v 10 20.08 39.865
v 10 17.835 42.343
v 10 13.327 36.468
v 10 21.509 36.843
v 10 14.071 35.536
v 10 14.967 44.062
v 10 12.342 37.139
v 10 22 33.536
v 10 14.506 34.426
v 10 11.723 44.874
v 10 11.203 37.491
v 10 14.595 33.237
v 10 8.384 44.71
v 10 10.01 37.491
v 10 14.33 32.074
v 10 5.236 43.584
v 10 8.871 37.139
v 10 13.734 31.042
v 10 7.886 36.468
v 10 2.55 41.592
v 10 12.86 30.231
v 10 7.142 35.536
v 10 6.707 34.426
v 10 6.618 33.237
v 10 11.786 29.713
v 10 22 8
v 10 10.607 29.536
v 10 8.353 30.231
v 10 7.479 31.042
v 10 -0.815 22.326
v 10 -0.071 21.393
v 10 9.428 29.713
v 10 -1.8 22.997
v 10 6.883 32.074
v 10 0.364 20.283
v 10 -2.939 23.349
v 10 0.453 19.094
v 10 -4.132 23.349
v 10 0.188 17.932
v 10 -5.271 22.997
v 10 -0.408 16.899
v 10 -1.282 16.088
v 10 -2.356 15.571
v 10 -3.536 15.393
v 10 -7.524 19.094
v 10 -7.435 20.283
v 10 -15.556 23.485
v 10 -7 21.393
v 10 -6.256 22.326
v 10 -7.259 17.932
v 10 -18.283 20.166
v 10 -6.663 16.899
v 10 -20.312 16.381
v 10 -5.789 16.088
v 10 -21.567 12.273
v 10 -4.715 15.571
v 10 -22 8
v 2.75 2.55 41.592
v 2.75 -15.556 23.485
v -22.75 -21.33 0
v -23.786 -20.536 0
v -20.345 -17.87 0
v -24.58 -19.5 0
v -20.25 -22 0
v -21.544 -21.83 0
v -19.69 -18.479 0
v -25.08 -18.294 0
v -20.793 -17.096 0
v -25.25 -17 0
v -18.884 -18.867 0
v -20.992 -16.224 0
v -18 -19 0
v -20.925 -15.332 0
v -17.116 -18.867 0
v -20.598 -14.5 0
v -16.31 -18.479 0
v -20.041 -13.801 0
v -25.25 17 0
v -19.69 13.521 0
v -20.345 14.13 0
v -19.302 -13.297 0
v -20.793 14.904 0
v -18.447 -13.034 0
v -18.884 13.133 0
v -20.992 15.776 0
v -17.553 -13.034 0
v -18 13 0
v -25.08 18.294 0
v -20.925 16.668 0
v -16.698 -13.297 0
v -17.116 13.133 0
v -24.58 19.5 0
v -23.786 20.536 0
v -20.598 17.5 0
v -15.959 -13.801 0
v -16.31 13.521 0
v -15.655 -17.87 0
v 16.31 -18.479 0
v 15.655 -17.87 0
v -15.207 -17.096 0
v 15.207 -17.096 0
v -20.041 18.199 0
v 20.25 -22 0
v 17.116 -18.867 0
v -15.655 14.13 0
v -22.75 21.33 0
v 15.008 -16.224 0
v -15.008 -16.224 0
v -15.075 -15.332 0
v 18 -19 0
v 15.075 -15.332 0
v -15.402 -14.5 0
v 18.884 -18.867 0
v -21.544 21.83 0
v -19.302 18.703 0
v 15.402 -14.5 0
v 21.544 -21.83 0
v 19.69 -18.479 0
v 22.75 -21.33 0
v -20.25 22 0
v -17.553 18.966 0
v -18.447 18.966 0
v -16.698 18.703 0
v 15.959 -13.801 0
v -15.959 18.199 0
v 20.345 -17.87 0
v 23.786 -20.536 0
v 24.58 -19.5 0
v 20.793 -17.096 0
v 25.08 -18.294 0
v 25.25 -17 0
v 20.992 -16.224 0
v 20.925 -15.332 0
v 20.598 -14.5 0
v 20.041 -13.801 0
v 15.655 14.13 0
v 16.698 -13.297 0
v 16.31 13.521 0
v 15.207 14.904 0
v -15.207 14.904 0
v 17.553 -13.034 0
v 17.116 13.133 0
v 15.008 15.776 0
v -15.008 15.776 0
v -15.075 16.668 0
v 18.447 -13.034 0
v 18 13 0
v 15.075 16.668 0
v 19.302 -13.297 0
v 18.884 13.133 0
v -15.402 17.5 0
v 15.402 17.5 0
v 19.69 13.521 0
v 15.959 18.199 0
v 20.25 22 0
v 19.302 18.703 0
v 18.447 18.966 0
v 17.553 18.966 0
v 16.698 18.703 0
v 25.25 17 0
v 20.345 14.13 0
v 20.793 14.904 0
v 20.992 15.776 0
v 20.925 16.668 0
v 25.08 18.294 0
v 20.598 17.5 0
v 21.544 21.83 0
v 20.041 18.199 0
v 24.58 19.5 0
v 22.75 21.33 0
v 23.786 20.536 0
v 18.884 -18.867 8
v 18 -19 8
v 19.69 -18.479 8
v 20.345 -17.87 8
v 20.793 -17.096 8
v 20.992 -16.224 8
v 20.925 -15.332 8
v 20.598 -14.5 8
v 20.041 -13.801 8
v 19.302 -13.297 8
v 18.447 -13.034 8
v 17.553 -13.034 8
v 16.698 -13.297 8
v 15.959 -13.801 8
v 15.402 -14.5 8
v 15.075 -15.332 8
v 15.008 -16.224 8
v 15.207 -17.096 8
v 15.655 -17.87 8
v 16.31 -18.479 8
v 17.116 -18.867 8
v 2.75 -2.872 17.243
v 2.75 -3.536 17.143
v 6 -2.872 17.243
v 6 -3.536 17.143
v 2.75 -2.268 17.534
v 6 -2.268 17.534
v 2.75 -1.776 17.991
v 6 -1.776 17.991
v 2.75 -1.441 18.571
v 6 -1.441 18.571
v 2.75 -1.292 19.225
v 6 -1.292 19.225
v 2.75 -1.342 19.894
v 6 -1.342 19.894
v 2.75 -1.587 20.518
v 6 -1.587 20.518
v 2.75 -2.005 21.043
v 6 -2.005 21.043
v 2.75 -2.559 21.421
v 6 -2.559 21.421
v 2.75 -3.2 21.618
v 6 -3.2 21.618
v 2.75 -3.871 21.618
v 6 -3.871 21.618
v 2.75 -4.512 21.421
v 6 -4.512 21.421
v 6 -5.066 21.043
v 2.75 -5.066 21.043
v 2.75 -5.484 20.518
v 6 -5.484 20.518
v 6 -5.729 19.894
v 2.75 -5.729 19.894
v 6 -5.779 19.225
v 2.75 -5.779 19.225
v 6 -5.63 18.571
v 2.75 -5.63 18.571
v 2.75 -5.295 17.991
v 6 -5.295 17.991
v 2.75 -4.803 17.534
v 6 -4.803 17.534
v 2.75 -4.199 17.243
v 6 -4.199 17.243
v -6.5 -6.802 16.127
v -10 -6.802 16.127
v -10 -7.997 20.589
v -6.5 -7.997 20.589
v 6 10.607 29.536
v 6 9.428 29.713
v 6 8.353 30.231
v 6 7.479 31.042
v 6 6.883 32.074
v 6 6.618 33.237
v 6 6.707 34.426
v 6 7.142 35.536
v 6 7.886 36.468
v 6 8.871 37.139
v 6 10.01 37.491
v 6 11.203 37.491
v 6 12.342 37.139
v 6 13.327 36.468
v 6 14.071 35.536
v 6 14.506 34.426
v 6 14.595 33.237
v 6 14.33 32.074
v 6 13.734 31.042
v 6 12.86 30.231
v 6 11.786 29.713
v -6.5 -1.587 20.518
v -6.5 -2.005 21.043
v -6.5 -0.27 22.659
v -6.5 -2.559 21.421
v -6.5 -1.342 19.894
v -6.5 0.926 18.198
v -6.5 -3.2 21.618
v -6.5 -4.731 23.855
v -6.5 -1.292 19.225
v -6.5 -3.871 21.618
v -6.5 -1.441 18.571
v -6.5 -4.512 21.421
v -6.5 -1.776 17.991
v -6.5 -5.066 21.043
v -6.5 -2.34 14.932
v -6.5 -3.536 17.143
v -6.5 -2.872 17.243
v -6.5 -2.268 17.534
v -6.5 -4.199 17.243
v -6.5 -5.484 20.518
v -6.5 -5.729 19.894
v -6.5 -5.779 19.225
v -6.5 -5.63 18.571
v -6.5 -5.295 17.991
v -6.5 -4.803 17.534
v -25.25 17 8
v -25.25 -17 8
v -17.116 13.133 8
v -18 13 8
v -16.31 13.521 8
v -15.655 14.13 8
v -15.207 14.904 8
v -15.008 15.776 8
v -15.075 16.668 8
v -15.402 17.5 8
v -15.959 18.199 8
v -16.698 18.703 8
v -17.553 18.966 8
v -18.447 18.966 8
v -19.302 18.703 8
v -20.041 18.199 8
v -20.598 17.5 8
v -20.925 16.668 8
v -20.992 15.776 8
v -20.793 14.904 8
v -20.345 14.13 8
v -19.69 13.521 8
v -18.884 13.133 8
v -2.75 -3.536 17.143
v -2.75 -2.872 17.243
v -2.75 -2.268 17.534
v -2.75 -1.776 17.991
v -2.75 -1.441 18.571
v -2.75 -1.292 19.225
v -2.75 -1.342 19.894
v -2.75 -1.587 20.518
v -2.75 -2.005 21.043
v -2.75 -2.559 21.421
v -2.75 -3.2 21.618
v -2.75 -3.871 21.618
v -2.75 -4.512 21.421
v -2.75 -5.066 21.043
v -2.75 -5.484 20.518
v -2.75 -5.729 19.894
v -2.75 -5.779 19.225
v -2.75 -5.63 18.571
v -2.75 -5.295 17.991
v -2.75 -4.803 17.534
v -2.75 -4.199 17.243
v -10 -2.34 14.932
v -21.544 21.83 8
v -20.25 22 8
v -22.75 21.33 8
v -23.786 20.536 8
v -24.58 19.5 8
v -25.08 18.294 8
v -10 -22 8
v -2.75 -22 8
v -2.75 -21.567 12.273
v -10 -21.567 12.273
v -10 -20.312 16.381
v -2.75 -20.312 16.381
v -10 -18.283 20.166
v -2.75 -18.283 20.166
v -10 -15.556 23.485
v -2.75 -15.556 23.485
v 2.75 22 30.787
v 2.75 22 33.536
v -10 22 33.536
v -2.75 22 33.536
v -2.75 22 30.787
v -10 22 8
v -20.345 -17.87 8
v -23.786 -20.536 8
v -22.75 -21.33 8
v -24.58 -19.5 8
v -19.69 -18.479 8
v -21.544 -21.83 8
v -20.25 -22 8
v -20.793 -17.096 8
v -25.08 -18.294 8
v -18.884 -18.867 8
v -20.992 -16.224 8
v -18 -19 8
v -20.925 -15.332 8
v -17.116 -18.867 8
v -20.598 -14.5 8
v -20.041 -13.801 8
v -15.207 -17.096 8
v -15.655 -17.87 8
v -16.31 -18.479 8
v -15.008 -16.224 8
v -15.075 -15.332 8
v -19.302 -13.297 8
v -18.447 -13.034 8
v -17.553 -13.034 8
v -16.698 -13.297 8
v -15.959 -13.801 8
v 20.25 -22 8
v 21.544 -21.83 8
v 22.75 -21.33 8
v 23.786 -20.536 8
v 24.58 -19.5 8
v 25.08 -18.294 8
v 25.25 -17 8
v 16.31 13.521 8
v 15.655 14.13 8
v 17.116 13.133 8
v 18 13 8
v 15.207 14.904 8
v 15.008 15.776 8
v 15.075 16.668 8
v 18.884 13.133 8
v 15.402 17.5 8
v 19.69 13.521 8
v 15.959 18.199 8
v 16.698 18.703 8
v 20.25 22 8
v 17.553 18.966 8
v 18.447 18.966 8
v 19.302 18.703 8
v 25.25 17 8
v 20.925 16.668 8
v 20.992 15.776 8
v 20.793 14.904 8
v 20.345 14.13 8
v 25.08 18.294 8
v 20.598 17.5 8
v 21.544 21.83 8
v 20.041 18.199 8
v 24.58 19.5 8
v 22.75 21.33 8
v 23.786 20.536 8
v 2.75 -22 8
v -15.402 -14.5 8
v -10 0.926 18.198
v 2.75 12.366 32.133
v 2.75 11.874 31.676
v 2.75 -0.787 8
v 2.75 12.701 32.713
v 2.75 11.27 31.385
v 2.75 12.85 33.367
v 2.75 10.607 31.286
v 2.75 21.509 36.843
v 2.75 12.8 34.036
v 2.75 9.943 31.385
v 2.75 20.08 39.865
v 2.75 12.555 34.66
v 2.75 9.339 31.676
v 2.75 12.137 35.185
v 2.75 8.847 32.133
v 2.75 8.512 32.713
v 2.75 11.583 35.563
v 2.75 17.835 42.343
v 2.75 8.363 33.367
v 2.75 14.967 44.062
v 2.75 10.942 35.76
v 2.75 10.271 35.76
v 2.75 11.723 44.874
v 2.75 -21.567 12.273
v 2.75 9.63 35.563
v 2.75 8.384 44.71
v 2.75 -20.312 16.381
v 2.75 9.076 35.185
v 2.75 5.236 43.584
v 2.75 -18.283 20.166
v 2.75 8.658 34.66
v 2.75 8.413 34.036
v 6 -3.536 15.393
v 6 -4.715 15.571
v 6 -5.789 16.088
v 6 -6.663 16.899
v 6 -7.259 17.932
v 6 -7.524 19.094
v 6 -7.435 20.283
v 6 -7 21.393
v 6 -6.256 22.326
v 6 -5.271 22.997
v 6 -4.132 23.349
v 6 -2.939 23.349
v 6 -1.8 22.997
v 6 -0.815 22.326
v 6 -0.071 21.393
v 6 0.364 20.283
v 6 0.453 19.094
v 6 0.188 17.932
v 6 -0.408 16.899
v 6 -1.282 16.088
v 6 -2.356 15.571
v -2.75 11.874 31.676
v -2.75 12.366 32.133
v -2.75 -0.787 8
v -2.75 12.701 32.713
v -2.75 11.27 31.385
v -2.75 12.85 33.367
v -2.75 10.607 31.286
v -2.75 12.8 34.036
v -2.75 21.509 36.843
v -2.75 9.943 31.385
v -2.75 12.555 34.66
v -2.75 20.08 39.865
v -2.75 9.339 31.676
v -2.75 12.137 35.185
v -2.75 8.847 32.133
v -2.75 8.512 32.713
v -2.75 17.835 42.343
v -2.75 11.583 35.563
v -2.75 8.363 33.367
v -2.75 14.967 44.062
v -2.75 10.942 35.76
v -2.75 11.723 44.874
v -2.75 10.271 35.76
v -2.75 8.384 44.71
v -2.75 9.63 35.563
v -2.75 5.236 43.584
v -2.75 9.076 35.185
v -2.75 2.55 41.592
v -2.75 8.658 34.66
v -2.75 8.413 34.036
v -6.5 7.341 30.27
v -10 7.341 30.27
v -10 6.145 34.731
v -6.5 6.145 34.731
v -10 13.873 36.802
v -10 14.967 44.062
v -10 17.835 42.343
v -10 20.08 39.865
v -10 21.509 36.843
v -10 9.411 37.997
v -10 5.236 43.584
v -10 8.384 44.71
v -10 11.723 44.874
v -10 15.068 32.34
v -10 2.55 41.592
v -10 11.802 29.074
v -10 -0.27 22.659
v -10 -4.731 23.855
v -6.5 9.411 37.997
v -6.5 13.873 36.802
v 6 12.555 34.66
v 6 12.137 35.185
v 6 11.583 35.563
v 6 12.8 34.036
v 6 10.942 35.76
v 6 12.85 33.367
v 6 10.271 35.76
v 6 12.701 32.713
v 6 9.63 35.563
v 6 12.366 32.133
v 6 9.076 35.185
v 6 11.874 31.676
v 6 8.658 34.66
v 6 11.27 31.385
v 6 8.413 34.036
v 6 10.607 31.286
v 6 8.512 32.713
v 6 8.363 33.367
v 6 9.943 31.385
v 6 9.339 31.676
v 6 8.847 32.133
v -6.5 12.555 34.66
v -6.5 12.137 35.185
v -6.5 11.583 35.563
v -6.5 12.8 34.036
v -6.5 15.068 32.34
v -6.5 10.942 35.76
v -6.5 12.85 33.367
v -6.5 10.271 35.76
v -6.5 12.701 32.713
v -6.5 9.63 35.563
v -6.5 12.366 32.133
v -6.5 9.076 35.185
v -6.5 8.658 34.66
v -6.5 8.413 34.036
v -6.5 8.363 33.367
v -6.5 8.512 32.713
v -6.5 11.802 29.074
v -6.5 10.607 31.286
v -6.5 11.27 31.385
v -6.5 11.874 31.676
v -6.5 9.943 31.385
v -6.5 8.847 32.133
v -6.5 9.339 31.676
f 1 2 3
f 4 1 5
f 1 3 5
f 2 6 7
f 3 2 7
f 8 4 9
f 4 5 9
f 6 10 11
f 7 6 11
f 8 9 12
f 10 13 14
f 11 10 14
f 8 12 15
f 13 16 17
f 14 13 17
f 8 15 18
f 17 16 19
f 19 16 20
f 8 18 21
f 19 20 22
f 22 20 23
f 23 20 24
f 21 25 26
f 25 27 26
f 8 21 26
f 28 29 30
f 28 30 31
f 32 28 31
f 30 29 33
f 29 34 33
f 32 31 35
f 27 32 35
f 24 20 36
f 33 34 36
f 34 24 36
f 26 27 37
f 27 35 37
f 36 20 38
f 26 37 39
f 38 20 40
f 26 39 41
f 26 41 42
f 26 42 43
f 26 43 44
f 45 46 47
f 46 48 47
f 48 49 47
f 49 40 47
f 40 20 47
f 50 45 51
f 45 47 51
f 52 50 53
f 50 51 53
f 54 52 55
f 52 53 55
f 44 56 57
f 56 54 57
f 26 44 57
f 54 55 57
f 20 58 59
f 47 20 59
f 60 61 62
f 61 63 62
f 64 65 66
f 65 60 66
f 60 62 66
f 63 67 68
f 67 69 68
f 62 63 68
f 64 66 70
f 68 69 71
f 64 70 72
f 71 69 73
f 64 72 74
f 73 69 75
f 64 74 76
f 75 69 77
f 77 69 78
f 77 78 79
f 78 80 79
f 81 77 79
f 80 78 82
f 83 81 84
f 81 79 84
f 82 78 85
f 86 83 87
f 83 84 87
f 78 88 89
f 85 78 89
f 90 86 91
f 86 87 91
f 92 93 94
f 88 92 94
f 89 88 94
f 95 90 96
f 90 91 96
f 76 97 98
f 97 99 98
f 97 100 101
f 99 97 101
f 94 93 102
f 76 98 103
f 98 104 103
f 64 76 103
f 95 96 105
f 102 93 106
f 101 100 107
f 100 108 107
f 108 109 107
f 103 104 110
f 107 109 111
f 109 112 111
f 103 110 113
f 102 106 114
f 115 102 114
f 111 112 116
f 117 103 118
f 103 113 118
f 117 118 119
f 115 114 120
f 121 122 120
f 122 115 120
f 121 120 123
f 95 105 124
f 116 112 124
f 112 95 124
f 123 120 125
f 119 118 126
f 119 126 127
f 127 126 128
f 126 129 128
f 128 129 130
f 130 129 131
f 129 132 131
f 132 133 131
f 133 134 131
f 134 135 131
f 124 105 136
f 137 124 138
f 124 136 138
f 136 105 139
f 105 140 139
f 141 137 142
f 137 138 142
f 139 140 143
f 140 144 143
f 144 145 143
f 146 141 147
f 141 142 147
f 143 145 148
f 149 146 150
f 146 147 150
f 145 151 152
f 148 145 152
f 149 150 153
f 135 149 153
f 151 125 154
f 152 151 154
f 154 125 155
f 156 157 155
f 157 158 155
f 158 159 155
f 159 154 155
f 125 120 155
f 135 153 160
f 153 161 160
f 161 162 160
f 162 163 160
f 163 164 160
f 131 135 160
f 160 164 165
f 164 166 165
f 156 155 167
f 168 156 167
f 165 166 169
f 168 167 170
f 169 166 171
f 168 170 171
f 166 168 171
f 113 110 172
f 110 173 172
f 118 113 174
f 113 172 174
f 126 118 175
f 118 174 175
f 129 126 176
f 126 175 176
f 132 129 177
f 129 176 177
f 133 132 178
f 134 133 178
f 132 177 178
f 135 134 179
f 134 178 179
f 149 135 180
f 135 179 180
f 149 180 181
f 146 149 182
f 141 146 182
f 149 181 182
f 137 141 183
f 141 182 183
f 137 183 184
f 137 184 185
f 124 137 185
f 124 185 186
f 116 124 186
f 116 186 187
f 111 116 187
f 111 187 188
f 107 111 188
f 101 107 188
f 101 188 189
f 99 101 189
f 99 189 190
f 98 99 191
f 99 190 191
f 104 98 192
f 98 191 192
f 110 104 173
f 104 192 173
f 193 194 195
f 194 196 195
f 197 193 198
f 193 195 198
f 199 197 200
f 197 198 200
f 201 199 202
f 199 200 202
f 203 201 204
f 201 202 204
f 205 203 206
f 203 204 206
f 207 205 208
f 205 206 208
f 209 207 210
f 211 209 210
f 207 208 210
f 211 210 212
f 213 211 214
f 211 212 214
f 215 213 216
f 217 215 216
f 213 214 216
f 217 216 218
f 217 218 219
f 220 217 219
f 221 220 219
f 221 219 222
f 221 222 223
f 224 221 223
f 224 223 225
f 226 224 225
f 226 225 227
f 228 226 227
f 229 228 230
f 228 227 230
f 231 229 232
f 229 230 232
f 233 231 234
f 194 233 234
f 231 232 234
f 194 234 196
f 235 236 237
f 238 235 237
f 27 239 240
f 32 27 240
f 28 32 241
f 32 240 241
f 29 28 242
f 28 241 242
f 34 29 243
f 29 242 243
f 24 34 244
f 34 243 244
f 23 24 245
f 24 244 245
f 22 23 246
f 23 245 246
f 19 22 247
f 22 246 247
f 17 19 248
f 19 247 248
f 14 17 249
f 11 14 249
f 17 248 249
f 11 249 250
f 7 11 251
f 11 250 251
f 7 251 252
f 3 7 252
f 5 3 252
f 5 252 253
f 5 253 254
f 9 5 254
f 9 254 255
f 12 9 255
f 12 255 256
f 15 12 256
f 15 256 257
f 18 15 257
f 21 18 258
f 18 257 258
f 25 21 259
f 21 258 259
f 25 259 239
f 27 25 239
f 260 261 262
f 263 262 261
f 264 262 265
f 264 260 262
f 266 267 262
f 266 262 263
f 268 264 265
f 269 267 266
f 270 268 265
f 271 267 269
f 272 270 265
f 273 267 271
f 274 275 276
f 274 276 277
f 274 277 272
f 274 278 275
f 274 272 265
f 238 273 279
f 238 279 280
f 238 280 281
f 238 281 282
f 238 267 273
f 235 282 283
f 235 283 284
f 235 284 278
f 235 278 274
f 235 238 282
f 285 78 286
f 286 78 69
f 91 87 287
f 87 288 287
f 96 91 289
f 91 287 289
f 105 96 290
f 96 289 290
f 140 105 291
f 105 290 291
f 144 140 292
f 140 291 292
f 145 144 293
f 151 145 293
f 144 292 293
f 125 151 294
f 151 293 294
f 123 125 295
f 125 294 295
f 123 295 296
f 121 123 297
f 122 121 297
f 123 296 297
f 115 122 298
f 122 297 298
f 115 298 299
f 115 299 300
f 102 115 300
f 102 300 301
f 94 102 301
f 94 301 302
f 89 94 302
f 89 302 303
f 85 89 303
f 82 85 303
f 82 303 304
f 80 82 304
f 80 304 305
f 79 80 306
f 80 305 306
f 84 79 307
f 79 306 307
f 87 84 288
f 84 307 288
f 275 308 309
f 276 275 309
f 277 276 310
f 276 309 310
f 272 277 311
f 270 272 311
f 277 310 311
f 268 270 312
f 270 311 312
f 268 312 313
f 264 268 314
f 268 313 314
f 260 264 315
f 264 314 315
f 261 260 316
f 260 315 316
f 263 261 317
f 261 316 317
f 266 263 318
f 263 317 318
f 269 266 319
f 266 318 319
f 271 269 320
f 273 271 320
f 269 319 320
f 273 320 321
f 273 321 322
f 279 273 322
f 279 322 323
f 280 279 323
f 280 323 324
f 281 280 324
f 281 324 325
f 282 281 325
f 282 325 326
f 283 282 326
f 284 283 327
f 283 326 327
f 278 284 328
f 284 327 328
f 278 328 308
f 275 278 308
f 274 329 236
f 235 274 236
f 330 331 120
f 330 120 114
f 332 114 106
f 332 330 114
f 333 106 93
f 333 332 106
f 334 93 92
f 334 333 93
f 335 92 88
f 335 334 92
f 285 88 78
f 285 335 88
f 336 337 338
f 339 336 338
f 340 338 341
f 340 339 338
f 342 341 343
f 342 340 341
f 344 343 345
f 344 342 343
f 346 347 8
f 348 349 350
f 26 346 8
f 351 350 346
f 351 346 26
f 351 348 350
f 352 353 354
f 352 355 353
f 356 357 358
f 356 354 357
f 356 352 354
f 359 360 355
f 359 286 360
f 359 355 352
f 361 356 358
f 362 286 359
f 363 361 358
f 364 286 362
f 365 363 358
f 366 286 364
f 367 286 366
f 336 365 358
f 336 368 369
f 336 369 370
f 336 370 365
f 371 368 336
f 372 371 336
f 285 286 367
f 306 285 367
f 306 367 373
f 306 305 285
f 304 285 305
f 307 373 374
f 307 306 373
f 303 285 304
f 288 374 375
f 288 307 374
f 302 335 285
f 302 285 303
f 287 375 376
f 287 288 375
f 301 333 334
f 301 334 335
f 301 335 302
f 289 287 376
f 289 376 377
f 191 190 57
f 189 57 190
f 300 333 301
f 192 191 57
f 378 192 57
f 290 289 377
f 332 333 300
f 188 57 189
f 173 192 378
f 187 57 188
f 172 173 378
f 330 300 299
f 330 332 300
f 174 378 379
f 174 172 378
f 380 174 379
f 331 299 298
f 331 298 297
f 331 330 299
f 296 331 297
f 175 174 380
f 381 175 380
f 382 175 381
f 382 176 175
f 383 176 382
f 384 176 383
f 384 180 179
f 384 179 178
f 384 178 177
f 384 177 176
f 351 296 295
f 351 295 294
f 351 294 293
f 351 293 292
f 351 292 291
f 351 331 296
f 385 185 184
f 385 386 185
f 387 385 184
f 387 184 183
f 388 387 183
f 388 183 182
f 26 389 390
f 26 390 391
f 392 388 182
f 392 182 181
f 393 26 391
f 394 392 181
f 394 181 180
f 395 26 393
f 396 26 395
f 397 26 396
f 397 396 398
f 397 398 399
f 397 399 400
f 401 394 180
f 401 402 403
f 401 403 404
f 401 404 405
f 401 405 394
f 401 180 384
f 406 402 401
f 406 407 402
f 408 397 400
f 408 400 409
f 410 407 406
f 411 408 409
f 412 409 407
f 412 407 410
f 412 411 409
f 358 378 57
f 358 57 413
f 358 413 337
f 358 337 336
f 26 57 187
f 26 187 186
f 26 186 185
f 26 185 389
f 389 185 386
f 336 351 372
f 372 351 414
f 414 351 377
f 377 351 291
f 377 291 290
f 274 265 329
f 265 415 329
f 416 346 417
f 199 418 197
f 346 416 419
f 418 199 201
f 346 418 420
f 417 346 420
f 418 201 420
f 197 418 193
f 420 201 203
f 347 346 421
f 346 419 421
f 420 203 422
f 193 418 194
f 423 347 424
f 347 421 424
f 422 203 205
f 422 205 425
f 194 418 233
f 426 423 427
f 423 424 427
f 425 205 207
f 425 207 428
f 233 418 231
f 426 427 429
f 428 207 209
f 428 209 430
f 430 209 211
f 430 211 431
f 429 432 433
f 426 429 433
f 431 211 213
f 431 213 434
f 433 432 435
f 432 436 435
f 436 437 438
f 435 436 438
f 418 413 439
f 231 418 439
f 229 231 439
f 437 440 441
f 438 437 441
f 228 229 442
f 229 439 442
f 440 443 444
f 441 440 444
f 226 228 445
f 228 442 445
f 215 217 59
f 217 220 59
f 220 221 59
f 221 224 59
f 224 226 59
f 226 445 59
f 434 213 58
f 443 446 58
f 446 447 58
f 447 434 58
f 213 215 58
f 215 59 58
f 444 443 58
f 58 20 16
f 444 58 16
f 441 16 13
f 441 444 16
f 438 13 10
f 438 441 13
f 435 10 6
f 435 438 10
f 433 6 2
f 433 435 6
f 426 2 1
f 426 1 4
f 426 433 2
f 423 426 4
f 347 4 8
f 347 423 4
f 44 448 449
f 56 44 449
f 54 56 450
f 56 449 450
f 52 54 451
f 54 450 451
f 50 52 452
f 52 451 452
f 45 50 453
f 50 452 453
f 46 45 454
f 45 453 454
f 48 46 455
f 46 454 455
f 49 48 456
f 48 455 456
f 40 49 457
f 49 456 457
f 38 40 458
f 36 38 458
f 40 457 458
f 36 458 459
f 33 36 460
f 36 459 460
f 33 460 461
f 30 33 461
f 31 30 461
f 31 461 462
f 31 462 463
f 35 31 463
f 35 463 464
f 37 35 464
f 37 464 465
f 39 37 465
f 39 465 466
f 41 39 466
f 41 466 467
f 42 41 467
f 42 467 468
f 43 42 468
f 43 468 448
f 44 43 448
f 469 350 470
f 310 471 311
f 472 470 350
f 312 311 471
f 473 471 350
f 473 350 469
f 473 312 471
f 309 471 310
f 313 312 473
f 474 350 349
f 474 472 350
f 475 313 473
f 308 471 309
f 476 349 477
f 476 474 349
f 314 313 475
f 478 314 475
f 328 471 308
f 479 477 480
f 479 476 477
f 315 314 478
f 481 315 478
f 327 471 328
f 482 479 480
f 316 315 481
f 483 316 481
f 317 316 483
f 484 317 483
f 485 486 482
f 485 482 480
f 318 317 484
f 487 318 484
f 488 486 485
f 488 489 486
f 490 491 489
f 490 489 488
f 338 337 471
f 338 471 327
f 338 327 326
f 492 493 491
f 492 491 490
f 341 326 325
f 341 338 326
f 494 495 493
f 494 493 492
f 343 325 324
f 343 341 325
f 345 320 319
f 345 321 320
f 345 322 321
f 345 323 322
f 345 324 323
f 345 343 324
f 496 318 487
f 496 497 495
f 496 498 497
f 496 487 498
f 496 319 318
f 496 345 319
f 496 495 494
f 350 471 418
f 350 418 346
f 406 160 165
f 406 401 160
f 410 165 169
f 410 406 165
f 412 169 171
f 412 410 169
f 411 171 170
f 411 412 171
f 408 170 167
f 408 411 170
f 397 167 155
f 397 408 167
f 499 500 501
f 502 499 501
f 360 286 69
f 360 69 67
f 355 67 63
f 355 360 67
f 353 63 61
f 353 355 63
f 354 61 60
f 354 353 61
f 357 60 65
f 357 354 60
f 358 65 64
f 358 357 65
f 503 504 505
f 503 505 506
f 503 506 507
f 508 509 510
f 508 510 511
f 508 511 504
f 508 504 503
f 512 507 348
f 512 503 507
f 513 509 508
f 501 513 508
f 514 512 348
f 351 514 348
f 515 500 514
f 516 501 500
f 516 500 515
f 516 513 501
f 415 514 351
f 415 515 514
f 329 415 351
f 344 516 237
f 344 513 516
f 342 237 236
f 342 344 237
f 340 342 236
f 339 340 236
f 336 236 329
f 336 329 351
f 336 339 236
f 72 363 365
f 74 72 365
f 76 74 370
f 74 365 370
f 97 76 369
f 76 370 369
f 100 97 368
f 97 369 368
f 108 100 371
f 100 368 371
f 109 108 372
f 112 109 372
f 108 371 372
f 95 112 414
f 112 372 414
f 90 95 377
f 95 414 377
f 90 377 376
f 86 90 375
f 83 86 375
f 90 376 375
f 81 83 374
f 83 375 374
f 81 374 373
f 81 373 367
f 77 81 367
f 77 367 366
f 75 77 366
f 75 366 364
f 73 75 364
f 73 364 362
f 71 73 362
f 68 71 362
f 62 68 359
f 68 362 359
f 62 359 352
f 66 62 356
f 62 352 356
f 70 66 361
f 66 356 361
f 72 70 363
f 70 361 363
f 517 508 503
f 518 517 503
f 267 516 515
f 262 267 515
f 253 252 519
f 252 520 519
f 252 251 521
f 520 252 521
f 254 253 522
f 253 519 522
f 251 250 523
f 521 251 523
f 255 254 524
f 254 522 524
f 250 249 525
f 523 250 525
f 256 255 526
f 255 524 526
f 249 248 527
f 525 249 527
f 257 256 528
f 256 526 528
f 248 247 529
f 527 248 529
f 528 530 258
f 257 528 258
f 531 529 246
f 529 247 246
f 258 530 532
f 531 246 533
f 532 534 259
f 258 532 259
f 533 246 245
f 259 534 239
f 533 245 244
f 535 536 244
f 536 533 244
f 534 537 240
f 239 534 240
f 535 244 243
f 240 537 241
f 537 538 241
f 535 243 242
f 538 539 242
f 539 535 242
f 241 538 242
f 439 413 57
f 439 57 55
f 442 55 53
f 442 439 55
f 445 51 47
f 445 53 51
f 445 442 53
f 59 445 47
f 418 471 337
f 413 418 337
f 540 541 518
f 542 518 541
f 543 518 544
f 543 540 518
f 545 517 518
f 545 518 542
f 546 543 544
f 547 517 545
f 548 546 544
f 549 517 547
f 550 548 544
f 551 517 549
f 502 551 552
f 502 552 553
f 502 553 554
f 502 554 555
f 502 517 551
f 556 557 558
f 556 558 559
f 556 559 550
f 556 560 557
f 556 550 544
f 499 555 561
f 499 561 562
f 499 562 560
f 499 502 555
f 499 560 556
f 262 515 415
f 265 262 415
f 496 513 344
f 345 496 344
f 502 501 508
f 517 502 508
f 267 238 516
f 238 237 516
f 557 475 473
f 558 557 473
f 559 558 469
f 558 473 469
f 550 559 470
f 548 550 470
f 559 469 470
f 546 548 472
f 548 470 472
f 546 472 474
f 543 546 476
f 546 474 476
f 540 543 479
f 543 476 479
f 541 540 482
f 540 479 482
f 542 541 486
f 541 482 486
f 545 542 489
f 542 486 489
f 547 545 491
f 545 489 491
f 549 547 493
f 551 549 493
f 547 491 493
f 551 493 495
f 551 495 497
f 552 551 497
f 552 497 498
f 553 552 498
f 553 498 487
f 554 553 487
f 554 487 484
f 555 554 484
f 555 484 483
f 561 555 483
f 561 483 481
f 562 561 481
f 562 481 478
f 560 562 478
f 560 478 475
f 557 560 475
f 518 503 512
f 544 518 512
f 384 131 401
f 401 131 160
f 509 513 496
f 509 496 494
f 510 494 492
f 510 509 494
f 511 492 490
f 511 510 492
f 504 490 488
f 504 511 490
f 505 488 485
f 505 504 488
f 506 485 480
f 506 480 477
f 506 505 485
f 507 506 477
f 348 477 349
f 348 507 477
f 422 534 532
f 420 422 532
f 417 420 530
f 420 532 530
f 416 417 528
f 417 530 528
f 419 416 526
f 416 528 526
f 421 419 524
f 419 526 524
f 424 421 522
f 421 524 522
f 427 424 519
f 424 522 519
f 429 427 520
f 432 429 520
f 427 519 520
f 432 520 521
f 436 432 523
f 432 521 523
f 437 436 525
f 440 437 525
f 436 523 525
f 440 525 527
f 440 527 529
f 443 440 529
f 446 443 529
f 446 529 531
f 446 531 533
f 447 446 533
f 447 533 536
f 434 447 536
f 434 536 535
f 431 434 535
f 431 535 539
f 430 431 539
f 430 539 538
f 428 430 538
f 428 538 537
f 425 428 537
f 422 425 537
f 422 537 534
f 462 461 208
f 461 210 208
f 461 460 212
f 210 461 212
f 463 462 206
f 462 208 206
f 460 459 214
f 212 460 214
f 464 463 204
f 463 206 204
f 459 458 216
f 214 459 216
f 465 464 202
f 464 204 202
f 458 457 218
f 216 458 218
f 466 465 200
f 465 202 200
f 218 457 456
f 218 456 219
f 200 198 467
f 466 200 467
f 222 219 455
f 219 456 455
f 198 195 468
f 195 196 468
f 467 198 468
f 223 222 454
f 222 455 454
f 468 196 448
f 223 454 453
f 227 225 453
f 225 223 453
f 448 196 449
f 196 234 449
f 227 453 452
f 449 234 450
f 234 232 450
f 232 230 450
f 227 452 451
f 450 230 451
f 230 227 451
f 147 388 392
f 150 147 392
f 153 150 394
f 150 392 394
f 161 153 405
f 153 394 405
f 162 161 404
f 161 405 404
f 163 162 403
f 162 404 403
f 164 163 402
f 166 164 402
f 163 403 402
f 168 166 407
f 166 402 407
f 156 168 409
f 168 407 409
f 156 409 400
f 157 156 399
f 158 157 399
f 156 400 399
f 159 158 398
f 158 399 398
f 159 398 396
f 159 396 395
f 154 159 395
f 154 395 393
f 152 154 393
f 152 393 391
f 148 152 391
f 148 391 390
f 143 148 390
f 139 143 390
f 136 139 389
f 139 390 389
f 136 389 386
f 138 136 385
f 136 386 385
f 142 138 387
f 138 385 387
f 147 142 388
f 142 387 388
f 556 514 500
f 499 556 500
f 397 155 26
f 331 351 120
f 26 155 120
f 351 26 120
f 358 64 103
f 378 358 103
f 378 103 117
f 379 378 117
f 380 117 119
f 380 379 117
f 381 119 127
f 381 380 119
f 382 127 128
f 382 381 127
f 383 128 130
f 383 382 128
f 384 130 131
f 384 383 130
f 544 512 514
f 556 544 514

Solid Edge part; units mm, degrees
sketch "Sketch1" plane through (0, 0, 0) normal (0, 0, 1) x (1, 0, 0)
  line L0 (25.25, -22) -> (25.25, 22)
  line L1 (25.25, 22) -> (-25.25, 22)
  line L2 (-25.25, 22) -> (-25.25, -22)
  line L3 (-25.25, -22) -> (25.25, -22)
extrude "Protrusion1" add sketch "Sketch1" along normal blind 8
sketch "Sketch2" plane through (0, 0, 0) normal (1, 0, 0) x (0, 1, 0)
  line L0 (22, 33.5355) -> (22, 8)
  line L1 (22, 8) -> (-22, 8)
  arc A0 (-15.5565, 23.4852) -> (-22, 8) centre (-0.0001, 7.9288) ccw
  line L2 (2.5503, 41.5919) -> (-15.5565, 23.4852)
  arc A1 (2.5503, 41.5919) -> (22, 33.5355) centre (10.6066, 33.5355) cw
extrude "ProtrusiónExtruida_2" add sketch "Sketch2" along normal mid plane 20
sketch "Sketch3" plane through (0, 0, 0) normal (1, 0, 0) x (0, 1, 0)
  line L0 (-0.7868, 8) -> (22, 30.7868)
  line L1 (22, 30.7868) -> (22, 33.5355)
  line L2 (2.5503, 41.5919) -> (-15.5565, 23.4852)
  arc A0 (-15.5565, 23.4852) -> (-22, 8) centre (-0.0001, 7.9288) ccw
  line L3 (-0.7868, 8) -> (-22, 8)
  arc A1 (2.5503, 41.5919) -> (22, 33.5355) centre (10.6066, 33.5355) cw
extrude "VaciadoExtruido_1" cut sketch "Sketch3" along normal mid plane 5.5
hole "Agujero_1" at (10, 10.6066, 33.5355) direction (-1, 0, 0) diameter 4.5 end through all counterbore diameter 8 counterbore depth 4
hole "Hole1" at (10, -3.5355, 19.3934) direction (-1, 0, 0) diameter 4.5 end through all counterbore diameter 8 counterbore depth 4
sketch "Sketch4" plane through (-10, 0, 26.4645) normal (-1, 0, 0) x (0, -1, 0)
  line L0 (-6.1452, 8.2665) -> (-9.4112, 11.5325)
  line L1 (-9.4112, 11.5325) -> (-13.8726, 10.3371)
  line L2 (-13.8726, 10.3371) -> (-15.068, 5.8756)
  line L3 (-15.068, 5.8756) -> (-11.802, 2.6096)
  line L4 (-11.802, 2.6096) -> (-7.3406, 3.8051)
  line L5 (-7.3406, 3.8051) -> (-6.1452, 8.2665)
  line L6 (7.997, -5.8756) -> (4.731, -2.6096)
  line L7 (4.731, -2.6096) -> (0.2695, -3.8051)
  line L8 (0.2695, -3.8051) -> (-0.9259, -8.2665)
  line L9 (-0.9259, -8.2665) -> (2.3401, -11.5325)
  line L10 (2.3401, -11.5325) -> (6.8015, -10.3371)
  line L11 (6.8015, -10.3371) -> (7.997, -5.8756)
extrude "VaciadoExtruido_2" cut sketch "Sketch4" against normal blind 3.5
hole "Agujero_3" at (18, 16, 8) direction (0, 0, -1) diameter 6 end through all
hole "Hole2" at (18, -16, 8) direction (0, 0, -1) diameter 6 end through all
hole "Hole3" at (-18, -16, 8) direction (0, 0, -1) diameter 6 end through all
hole "Hole4" at (-18, 16, 8) direction (0, 0, -1) diameter 6 end through all
fillet "Redondeo_1" radius 5 4 edges at (25.25, -22, 4) (-25.25, -22, 4) (-25.25, 22, 4) (25.25, 22, 4)
